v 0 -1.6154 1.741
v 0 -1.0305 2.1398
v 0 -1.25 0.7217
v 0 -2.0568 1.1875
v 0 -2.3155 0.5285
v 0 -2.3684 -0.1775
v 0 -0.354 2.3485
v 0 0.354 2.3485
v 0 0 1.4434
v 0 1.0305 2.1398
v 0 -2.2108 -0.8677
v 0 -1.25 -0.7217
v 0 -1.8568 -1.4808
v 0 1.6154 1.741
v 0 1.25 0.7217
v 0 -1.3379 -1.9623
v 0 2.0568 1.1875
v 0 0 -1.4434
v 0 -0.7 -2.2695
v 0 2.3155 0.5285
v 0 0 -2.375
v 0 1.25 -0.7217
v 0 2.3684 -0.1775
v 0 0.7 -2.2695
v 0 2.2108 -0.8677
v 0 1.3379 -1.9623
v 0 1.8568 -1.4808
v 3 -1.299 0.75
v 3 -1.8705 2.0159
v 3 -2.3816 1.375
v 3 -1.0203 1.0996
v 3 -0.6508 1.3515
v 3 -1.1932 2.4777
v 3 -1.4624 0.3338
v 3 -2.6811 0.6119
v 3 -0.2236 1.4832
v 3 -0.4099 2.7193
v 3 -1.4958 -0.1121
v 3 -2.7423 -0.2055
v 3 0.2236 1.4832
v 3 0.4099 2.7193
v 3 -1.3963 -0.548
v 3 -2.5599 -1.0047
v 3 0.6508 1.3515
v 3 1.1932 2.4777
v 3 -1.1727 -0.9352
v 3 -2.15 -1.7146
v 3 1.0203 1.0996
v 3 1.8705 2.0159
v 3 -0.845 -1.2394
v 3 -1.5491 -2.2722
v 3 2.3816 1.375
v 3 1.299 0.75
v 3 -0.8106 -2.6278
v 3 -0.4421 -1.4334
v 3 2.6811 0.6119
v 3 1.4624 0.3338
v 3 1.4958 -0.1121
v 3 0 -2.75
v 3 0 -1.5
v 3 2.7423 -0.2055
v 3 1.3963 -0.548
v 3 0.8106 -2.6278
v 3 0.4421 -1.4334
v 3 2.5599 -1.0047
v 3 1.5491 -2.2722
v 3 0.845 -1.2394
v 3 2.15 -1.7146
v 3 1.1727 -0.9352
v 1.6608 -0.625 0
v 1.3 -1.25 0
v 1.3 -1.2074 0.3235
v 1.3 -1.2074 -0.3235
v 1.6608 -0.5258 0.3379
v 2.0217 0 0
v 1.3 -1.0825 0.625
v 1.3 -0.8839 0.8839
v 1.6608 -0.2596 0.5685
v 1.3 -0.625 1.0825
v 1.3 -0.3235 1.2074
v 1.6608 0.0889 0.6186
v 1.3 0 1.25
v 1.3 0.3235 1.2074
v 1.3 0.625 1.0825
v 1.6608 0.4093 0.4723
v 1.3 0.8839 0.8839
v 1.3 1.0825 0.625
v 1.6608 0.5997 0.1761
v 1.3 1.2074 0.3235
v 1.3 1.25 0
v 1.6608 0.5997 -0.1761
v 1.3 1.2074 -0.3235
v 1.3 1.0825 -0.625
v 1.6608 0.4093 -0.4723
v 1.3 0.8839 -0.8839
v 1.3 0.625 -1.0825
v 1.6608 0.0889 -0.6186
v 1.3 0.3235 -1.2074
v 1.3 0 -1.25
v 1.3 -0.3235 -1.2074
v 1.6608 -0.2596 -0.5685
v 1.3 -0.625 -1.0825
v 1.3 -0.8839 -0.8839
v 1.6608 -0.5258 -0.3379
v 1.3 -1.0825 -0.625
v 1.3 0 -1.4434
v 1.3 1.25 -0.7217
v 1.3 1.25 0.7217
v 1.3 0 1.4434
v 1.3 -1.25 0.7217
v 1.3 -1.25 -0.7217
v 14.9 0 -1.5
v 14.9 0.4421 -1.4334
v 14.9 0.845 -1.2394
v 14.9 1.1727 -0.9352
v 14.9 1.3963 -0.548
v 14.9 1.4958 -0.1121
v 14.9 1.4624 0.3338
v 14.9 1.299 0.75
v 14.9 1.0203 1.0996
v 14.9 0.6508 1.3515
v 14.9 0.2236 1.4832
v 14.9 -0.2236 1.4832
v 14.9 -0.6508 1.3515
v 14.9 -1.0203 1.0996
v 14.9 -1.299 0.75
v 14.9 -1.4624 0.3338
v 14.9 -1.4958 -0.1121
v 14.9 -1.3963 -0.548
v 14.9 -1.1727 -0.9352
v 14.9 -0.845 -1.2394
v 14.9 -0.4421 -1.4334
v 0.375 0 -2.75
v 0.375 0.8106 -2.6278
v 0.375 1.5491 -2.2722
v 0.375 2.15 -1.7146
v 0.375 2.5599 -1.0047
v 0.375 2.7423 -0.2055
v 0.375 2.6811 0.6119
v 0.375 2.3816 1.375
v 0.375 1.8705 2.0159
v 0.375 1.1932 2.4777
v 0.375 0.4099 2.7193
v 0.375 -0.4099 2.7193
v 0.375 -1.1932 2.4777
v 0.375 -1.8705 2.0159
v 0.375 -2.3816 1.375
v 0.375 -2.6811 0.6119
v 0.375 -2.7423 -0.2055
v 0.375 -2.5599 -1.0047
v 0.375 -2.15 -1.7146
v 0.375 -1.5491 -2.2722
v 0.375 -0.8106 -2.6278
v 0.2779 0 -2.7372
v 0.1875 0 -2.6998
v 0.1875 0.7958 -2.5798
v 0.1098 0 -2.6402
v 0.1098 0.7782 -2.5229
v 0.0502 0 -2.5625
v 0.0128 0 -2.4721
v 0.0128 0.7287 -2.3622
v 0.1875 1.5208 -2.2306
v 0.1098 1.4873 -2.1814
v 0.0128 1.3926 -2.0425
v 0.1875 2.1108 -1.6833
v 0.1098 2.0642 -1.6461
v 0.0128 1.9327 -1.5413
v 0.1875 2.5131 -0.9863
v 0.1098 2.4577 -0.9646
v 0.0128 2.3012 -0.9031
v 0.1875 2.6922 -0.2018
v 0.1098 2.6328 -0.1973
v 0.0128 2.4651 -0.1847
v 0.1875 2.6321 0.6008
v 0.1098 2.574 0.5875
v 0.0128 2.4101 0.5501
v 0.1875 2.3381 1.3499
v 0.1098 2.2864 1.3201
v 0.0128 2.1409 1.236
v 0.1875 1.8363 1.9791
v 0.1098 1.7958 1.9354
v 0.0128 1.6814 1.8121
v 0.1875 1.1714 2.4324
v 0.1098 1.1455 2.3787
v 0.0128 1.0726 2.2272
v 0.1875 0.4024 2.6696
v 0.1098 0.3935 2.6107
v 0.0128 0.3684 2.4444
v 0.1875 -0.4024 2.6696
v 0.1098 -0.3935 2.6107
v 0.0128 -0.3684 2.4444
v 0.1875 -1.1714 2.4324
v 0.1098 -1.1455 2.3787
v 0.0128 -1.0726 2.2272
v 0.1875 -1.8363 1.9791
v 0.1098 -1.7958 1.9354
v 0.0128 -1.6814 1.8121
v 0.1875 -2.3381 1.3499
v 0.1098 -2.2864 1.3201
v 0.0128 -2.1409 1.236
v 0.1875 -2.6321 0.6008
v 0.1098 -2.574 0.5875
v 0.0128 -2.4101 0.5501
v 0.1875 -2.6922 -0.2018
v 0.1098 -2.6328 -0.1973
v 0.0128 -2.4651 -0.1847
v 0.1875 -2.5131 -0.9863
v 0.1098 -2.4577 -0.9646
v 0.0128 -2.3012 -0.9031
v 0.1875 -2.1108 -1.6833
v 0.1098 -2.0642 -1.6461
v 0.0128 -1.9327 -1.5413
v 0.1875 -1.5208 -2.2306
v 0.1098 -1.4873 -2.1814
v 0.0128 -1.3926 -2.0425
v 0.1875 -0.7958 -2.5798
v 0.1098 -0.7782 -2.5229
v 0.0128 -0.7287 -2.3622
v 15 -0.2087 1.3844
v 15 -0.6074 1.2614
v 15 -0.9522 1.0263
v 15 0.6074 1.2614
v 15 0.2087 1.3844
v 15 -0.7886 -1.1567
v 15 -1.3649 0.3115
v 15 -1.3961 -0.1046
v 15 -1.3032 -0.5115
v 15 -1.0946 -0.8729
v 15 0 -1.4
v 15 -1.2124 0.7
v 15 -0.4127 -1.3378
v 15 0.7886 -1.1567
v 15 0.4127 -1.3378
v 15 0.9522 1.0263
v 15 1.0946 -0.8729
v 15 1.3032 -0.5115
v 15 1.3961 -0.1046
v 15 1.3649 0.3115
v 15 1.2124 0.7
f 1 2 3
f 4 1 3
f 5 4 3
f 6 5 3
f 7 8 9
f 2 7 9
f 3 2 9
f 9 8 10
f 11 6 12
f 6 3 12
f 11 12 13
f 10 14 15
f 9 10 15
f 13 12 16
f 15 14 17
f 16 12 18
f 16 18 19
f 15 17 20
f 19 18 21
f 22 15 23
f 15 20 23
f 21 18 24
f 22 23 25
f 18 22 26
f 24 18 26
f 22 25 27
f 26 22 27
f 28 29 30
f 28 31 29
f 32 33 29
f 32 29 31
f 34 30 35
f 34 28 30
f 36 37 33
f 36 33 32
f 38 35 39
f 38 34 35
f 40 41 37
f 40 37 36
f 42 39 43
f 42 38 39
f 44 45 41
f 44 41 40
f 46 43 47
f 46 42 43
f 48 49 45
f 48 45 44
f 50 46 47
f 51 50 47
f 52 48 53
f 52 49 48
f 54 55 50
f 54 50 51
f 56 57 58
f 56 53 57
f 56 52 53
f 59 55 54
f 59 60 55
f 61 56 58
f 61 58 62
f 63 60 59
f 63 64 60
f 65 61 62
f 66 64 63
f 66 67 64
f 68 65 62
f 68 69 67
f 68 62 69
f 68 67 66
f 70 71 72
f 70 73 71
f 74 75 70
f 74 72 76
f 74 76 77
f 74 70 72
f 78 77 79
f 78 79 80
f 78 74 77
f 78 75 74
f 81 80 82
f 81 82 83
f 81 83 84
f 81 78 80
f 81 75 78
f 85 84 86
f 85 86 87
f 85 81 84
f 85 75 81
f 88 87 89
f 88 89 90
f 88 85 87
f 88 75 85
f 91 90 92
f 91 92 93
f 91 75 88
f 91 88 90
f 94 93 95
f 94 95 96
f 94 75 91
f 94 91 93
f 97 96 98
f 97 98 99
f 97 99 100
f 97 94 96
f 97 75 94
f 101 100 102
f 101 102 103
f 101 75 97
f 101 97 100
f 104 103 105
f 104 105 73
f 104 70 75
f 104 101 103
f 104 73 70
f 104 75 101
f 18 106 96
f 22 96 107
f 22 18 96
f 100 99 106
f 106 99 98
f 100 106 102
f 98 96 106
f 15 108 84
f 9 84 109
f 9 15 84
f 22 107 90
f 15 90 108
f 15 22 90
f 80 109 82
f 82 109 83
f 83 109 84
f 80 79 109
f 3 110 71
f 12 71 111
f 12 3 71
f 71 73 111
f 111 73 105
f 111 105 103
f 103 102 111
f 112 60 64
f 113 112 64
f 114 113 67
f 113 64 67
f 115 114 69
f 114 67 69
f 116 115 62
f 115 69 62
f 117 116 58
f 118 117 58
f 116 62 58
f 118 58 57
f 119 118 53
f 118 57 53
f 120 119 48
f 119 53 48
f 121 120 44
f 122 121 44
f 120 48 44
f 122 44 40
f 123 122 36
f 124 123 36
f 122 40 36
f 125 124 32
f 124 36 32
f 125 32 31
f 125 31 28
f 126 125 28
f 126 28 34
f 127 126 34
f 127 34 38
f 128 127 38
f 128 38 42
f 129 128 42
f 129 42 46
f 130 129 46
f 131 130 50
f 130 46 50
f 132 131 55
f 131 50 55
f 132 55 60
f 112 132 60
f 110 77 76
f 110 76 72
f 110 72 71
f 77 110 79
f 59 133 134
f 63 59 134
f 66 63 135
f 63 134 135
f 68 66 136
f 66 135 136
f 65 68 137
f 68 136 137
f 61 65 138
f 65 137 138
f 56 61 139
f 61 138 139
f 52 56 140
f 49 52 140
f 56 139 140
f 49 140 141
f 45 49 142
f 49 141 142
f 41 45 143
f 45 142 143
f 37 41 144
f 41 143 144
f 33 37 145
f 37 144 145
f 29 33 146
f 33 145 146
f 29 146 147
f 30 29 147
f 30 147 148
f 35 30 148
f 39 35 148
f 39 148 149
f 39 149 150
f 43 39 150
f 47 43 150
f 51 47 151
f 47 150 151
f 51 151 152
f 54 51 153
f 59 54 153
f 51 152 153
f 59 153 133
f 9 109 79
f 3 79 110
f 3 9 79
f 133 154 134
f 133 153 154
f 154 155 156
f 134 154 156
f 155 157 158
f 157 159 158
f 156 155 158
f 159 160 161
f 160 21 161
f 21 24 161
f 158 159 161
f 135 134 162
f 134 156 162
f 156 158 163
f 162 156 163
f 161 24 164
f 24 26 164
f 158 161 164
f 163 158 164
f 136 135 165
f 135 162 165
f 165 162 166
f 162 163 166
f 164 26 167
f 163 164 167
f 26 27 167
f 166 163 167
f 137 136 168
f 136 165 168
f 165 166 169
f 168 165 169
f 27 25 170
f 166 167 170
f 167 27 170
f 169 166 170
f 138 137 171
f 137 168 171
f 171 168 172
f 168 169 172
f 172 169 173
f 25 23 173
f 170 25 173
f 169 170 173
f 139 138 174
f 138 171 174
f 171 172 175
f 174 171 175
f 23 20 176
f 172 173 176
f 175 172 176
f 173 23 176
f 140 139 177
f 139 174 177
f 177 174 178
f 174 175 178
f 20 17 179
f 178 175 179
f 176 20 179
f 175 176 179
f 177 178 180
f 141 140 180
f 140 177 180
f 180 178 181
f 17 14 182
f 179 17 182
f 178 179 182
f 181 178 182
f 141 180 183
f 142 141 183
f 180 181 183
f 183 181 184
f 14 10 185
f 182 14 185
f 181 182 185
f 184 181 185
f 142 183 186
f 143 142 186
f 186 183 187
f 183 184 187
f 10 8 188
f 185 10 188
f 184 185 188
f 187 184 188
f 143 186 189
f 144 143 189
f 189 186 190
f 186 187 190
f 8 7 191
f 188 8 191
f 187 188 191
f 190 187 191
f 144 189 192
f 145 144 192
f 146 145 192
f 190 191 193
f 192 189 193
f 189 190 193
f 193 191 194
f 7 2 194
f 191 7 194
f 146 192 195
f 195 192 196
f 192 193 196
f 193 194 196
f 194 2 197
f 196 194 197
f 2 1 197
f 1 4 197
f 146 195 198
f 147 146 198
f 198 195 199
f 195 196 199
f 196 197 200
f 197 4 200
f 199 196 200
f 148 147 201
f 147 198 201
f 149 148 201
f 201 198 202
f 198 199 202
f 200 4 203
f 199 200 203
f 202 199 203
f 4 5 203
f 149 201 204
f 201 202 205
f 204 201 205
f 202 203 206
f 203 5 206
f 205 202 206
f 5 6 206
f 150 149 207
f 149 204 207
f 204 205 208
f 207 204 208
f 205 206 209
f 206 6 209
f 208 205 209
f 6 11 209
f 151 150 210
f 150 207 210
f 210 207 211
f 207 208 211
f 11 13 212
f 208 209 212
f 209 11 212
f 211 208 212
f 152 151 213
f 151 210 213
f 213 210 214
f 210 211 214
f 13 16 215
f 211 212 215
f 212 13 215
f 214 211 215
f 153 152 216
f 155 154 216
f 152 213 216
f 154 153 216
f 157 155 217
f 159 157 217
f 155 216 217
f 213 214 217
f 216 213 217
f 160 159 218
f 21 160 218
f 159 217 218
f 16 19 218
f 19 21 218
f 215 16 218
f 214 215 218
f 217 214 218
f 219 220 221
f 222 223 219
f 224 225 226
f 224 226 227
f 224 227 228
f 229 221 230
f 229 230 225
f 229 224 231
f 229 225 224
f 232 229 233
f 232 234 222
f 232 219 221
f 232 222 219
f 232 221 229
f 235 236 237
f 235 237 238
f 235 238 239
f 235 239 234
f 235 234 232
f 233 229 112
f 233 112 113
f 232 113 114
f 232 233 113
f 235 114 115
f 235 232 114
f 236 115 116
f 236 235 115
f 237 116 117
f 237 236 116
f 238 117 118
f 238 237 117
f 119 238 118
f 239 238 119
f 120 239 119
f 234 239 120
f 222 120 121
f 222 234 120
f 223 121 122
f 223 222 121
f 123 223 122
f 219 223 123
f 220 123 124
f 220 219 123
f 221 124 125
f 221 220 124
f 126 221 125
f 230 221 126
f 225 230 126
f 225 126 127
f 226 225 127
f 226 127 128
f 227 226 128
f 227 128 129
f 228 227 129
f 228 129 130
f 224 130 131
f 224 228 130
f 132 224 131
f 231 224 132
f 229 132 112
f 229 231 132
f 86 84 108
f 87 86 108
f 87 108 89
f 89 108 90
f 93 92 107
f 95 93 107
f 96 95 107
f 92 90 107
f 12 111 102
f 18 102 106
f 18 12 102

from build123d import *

# Parameters (mm, degrees)
SKETCH1_R           = 2.75
BASEHEAD_DEPTH      = 3
SKETCH2_R           = 1.5
BASEBODY_DEPTH      = 12
HEXAGONSOCKET_DEPTH = 1.3
TOPFILLET_R         = 0.375
CHAMFER1_SIZE       = 0.1


with BuildPart() as part:
    # Sketch1 → BaseHead (new body)
    with BuildSketch(Plane(origin=(0, 0, 0), x_dir=(0, 0, -1), z_dir=(1, 0, 0))):
        Circle(SKETCH1_R)
    extrude(amount=BASEHEAD_DEPTH)

    # Sketch2 → BaseBody (add)
    with BuildSketch(Plane(origin=(3, 0, 0), x_dir=(0, 0, -1), z_dir=(1, 0, 0))):
        Circle(SKETCH2_R)
    extrude(amount=BASEBODY_DEPTH)

    # Sketch3 → HexagonSocket (cut)
    with BuildSketch(Plane(origin=(0, 0, 0), x_dir=(0, 0, -1), z_dir=(1, 0, 0))):
        Polygon((1.443375673, 0), (0.721687836, 1.25), (-0.721687836, 1.25), (-1.443375673, 0), (-0.721687836, -1.25), (0.721687836, -1.25), align=None)
    extrude(amount=HEXAGONSOCKET_DEPTH, mode=Mode.SUBTRACT)

    # Sketch4 → Cut-Revolve1 (revolve, cut)
    with BuildSketch(Plane(origin=(-4.19613823, 0.75, 0), x_dir=(-1, 0, 0), z_dir=(0, 0, 1))):
        Polygon((-5.49613823, 2), (-6.217826066, 0.75), (-5.49613823, 0.75), align=None)
    revolve(axis=Axis((0.838992387, 0, 0), (-1, 0, 0)), mode=Mode.SUBTRACT)

    # TopFillet
    topfillet_edges = [part.edges().sort_by_distance(p)[0] for p in [
        (0, 0, 2.75),
    ]]
    fillet(topfillet_edges, radius=TOPFILLET_R)

    # Chamfer1
    chamfer1_edges = [part.edges().sort_by_distance(p)[0] for p in [
        (15, 0, 1.5),
    ]]
    chamfer(chamfer1_edges, length=CHAMFER1_SIZE)


solid = part.part
